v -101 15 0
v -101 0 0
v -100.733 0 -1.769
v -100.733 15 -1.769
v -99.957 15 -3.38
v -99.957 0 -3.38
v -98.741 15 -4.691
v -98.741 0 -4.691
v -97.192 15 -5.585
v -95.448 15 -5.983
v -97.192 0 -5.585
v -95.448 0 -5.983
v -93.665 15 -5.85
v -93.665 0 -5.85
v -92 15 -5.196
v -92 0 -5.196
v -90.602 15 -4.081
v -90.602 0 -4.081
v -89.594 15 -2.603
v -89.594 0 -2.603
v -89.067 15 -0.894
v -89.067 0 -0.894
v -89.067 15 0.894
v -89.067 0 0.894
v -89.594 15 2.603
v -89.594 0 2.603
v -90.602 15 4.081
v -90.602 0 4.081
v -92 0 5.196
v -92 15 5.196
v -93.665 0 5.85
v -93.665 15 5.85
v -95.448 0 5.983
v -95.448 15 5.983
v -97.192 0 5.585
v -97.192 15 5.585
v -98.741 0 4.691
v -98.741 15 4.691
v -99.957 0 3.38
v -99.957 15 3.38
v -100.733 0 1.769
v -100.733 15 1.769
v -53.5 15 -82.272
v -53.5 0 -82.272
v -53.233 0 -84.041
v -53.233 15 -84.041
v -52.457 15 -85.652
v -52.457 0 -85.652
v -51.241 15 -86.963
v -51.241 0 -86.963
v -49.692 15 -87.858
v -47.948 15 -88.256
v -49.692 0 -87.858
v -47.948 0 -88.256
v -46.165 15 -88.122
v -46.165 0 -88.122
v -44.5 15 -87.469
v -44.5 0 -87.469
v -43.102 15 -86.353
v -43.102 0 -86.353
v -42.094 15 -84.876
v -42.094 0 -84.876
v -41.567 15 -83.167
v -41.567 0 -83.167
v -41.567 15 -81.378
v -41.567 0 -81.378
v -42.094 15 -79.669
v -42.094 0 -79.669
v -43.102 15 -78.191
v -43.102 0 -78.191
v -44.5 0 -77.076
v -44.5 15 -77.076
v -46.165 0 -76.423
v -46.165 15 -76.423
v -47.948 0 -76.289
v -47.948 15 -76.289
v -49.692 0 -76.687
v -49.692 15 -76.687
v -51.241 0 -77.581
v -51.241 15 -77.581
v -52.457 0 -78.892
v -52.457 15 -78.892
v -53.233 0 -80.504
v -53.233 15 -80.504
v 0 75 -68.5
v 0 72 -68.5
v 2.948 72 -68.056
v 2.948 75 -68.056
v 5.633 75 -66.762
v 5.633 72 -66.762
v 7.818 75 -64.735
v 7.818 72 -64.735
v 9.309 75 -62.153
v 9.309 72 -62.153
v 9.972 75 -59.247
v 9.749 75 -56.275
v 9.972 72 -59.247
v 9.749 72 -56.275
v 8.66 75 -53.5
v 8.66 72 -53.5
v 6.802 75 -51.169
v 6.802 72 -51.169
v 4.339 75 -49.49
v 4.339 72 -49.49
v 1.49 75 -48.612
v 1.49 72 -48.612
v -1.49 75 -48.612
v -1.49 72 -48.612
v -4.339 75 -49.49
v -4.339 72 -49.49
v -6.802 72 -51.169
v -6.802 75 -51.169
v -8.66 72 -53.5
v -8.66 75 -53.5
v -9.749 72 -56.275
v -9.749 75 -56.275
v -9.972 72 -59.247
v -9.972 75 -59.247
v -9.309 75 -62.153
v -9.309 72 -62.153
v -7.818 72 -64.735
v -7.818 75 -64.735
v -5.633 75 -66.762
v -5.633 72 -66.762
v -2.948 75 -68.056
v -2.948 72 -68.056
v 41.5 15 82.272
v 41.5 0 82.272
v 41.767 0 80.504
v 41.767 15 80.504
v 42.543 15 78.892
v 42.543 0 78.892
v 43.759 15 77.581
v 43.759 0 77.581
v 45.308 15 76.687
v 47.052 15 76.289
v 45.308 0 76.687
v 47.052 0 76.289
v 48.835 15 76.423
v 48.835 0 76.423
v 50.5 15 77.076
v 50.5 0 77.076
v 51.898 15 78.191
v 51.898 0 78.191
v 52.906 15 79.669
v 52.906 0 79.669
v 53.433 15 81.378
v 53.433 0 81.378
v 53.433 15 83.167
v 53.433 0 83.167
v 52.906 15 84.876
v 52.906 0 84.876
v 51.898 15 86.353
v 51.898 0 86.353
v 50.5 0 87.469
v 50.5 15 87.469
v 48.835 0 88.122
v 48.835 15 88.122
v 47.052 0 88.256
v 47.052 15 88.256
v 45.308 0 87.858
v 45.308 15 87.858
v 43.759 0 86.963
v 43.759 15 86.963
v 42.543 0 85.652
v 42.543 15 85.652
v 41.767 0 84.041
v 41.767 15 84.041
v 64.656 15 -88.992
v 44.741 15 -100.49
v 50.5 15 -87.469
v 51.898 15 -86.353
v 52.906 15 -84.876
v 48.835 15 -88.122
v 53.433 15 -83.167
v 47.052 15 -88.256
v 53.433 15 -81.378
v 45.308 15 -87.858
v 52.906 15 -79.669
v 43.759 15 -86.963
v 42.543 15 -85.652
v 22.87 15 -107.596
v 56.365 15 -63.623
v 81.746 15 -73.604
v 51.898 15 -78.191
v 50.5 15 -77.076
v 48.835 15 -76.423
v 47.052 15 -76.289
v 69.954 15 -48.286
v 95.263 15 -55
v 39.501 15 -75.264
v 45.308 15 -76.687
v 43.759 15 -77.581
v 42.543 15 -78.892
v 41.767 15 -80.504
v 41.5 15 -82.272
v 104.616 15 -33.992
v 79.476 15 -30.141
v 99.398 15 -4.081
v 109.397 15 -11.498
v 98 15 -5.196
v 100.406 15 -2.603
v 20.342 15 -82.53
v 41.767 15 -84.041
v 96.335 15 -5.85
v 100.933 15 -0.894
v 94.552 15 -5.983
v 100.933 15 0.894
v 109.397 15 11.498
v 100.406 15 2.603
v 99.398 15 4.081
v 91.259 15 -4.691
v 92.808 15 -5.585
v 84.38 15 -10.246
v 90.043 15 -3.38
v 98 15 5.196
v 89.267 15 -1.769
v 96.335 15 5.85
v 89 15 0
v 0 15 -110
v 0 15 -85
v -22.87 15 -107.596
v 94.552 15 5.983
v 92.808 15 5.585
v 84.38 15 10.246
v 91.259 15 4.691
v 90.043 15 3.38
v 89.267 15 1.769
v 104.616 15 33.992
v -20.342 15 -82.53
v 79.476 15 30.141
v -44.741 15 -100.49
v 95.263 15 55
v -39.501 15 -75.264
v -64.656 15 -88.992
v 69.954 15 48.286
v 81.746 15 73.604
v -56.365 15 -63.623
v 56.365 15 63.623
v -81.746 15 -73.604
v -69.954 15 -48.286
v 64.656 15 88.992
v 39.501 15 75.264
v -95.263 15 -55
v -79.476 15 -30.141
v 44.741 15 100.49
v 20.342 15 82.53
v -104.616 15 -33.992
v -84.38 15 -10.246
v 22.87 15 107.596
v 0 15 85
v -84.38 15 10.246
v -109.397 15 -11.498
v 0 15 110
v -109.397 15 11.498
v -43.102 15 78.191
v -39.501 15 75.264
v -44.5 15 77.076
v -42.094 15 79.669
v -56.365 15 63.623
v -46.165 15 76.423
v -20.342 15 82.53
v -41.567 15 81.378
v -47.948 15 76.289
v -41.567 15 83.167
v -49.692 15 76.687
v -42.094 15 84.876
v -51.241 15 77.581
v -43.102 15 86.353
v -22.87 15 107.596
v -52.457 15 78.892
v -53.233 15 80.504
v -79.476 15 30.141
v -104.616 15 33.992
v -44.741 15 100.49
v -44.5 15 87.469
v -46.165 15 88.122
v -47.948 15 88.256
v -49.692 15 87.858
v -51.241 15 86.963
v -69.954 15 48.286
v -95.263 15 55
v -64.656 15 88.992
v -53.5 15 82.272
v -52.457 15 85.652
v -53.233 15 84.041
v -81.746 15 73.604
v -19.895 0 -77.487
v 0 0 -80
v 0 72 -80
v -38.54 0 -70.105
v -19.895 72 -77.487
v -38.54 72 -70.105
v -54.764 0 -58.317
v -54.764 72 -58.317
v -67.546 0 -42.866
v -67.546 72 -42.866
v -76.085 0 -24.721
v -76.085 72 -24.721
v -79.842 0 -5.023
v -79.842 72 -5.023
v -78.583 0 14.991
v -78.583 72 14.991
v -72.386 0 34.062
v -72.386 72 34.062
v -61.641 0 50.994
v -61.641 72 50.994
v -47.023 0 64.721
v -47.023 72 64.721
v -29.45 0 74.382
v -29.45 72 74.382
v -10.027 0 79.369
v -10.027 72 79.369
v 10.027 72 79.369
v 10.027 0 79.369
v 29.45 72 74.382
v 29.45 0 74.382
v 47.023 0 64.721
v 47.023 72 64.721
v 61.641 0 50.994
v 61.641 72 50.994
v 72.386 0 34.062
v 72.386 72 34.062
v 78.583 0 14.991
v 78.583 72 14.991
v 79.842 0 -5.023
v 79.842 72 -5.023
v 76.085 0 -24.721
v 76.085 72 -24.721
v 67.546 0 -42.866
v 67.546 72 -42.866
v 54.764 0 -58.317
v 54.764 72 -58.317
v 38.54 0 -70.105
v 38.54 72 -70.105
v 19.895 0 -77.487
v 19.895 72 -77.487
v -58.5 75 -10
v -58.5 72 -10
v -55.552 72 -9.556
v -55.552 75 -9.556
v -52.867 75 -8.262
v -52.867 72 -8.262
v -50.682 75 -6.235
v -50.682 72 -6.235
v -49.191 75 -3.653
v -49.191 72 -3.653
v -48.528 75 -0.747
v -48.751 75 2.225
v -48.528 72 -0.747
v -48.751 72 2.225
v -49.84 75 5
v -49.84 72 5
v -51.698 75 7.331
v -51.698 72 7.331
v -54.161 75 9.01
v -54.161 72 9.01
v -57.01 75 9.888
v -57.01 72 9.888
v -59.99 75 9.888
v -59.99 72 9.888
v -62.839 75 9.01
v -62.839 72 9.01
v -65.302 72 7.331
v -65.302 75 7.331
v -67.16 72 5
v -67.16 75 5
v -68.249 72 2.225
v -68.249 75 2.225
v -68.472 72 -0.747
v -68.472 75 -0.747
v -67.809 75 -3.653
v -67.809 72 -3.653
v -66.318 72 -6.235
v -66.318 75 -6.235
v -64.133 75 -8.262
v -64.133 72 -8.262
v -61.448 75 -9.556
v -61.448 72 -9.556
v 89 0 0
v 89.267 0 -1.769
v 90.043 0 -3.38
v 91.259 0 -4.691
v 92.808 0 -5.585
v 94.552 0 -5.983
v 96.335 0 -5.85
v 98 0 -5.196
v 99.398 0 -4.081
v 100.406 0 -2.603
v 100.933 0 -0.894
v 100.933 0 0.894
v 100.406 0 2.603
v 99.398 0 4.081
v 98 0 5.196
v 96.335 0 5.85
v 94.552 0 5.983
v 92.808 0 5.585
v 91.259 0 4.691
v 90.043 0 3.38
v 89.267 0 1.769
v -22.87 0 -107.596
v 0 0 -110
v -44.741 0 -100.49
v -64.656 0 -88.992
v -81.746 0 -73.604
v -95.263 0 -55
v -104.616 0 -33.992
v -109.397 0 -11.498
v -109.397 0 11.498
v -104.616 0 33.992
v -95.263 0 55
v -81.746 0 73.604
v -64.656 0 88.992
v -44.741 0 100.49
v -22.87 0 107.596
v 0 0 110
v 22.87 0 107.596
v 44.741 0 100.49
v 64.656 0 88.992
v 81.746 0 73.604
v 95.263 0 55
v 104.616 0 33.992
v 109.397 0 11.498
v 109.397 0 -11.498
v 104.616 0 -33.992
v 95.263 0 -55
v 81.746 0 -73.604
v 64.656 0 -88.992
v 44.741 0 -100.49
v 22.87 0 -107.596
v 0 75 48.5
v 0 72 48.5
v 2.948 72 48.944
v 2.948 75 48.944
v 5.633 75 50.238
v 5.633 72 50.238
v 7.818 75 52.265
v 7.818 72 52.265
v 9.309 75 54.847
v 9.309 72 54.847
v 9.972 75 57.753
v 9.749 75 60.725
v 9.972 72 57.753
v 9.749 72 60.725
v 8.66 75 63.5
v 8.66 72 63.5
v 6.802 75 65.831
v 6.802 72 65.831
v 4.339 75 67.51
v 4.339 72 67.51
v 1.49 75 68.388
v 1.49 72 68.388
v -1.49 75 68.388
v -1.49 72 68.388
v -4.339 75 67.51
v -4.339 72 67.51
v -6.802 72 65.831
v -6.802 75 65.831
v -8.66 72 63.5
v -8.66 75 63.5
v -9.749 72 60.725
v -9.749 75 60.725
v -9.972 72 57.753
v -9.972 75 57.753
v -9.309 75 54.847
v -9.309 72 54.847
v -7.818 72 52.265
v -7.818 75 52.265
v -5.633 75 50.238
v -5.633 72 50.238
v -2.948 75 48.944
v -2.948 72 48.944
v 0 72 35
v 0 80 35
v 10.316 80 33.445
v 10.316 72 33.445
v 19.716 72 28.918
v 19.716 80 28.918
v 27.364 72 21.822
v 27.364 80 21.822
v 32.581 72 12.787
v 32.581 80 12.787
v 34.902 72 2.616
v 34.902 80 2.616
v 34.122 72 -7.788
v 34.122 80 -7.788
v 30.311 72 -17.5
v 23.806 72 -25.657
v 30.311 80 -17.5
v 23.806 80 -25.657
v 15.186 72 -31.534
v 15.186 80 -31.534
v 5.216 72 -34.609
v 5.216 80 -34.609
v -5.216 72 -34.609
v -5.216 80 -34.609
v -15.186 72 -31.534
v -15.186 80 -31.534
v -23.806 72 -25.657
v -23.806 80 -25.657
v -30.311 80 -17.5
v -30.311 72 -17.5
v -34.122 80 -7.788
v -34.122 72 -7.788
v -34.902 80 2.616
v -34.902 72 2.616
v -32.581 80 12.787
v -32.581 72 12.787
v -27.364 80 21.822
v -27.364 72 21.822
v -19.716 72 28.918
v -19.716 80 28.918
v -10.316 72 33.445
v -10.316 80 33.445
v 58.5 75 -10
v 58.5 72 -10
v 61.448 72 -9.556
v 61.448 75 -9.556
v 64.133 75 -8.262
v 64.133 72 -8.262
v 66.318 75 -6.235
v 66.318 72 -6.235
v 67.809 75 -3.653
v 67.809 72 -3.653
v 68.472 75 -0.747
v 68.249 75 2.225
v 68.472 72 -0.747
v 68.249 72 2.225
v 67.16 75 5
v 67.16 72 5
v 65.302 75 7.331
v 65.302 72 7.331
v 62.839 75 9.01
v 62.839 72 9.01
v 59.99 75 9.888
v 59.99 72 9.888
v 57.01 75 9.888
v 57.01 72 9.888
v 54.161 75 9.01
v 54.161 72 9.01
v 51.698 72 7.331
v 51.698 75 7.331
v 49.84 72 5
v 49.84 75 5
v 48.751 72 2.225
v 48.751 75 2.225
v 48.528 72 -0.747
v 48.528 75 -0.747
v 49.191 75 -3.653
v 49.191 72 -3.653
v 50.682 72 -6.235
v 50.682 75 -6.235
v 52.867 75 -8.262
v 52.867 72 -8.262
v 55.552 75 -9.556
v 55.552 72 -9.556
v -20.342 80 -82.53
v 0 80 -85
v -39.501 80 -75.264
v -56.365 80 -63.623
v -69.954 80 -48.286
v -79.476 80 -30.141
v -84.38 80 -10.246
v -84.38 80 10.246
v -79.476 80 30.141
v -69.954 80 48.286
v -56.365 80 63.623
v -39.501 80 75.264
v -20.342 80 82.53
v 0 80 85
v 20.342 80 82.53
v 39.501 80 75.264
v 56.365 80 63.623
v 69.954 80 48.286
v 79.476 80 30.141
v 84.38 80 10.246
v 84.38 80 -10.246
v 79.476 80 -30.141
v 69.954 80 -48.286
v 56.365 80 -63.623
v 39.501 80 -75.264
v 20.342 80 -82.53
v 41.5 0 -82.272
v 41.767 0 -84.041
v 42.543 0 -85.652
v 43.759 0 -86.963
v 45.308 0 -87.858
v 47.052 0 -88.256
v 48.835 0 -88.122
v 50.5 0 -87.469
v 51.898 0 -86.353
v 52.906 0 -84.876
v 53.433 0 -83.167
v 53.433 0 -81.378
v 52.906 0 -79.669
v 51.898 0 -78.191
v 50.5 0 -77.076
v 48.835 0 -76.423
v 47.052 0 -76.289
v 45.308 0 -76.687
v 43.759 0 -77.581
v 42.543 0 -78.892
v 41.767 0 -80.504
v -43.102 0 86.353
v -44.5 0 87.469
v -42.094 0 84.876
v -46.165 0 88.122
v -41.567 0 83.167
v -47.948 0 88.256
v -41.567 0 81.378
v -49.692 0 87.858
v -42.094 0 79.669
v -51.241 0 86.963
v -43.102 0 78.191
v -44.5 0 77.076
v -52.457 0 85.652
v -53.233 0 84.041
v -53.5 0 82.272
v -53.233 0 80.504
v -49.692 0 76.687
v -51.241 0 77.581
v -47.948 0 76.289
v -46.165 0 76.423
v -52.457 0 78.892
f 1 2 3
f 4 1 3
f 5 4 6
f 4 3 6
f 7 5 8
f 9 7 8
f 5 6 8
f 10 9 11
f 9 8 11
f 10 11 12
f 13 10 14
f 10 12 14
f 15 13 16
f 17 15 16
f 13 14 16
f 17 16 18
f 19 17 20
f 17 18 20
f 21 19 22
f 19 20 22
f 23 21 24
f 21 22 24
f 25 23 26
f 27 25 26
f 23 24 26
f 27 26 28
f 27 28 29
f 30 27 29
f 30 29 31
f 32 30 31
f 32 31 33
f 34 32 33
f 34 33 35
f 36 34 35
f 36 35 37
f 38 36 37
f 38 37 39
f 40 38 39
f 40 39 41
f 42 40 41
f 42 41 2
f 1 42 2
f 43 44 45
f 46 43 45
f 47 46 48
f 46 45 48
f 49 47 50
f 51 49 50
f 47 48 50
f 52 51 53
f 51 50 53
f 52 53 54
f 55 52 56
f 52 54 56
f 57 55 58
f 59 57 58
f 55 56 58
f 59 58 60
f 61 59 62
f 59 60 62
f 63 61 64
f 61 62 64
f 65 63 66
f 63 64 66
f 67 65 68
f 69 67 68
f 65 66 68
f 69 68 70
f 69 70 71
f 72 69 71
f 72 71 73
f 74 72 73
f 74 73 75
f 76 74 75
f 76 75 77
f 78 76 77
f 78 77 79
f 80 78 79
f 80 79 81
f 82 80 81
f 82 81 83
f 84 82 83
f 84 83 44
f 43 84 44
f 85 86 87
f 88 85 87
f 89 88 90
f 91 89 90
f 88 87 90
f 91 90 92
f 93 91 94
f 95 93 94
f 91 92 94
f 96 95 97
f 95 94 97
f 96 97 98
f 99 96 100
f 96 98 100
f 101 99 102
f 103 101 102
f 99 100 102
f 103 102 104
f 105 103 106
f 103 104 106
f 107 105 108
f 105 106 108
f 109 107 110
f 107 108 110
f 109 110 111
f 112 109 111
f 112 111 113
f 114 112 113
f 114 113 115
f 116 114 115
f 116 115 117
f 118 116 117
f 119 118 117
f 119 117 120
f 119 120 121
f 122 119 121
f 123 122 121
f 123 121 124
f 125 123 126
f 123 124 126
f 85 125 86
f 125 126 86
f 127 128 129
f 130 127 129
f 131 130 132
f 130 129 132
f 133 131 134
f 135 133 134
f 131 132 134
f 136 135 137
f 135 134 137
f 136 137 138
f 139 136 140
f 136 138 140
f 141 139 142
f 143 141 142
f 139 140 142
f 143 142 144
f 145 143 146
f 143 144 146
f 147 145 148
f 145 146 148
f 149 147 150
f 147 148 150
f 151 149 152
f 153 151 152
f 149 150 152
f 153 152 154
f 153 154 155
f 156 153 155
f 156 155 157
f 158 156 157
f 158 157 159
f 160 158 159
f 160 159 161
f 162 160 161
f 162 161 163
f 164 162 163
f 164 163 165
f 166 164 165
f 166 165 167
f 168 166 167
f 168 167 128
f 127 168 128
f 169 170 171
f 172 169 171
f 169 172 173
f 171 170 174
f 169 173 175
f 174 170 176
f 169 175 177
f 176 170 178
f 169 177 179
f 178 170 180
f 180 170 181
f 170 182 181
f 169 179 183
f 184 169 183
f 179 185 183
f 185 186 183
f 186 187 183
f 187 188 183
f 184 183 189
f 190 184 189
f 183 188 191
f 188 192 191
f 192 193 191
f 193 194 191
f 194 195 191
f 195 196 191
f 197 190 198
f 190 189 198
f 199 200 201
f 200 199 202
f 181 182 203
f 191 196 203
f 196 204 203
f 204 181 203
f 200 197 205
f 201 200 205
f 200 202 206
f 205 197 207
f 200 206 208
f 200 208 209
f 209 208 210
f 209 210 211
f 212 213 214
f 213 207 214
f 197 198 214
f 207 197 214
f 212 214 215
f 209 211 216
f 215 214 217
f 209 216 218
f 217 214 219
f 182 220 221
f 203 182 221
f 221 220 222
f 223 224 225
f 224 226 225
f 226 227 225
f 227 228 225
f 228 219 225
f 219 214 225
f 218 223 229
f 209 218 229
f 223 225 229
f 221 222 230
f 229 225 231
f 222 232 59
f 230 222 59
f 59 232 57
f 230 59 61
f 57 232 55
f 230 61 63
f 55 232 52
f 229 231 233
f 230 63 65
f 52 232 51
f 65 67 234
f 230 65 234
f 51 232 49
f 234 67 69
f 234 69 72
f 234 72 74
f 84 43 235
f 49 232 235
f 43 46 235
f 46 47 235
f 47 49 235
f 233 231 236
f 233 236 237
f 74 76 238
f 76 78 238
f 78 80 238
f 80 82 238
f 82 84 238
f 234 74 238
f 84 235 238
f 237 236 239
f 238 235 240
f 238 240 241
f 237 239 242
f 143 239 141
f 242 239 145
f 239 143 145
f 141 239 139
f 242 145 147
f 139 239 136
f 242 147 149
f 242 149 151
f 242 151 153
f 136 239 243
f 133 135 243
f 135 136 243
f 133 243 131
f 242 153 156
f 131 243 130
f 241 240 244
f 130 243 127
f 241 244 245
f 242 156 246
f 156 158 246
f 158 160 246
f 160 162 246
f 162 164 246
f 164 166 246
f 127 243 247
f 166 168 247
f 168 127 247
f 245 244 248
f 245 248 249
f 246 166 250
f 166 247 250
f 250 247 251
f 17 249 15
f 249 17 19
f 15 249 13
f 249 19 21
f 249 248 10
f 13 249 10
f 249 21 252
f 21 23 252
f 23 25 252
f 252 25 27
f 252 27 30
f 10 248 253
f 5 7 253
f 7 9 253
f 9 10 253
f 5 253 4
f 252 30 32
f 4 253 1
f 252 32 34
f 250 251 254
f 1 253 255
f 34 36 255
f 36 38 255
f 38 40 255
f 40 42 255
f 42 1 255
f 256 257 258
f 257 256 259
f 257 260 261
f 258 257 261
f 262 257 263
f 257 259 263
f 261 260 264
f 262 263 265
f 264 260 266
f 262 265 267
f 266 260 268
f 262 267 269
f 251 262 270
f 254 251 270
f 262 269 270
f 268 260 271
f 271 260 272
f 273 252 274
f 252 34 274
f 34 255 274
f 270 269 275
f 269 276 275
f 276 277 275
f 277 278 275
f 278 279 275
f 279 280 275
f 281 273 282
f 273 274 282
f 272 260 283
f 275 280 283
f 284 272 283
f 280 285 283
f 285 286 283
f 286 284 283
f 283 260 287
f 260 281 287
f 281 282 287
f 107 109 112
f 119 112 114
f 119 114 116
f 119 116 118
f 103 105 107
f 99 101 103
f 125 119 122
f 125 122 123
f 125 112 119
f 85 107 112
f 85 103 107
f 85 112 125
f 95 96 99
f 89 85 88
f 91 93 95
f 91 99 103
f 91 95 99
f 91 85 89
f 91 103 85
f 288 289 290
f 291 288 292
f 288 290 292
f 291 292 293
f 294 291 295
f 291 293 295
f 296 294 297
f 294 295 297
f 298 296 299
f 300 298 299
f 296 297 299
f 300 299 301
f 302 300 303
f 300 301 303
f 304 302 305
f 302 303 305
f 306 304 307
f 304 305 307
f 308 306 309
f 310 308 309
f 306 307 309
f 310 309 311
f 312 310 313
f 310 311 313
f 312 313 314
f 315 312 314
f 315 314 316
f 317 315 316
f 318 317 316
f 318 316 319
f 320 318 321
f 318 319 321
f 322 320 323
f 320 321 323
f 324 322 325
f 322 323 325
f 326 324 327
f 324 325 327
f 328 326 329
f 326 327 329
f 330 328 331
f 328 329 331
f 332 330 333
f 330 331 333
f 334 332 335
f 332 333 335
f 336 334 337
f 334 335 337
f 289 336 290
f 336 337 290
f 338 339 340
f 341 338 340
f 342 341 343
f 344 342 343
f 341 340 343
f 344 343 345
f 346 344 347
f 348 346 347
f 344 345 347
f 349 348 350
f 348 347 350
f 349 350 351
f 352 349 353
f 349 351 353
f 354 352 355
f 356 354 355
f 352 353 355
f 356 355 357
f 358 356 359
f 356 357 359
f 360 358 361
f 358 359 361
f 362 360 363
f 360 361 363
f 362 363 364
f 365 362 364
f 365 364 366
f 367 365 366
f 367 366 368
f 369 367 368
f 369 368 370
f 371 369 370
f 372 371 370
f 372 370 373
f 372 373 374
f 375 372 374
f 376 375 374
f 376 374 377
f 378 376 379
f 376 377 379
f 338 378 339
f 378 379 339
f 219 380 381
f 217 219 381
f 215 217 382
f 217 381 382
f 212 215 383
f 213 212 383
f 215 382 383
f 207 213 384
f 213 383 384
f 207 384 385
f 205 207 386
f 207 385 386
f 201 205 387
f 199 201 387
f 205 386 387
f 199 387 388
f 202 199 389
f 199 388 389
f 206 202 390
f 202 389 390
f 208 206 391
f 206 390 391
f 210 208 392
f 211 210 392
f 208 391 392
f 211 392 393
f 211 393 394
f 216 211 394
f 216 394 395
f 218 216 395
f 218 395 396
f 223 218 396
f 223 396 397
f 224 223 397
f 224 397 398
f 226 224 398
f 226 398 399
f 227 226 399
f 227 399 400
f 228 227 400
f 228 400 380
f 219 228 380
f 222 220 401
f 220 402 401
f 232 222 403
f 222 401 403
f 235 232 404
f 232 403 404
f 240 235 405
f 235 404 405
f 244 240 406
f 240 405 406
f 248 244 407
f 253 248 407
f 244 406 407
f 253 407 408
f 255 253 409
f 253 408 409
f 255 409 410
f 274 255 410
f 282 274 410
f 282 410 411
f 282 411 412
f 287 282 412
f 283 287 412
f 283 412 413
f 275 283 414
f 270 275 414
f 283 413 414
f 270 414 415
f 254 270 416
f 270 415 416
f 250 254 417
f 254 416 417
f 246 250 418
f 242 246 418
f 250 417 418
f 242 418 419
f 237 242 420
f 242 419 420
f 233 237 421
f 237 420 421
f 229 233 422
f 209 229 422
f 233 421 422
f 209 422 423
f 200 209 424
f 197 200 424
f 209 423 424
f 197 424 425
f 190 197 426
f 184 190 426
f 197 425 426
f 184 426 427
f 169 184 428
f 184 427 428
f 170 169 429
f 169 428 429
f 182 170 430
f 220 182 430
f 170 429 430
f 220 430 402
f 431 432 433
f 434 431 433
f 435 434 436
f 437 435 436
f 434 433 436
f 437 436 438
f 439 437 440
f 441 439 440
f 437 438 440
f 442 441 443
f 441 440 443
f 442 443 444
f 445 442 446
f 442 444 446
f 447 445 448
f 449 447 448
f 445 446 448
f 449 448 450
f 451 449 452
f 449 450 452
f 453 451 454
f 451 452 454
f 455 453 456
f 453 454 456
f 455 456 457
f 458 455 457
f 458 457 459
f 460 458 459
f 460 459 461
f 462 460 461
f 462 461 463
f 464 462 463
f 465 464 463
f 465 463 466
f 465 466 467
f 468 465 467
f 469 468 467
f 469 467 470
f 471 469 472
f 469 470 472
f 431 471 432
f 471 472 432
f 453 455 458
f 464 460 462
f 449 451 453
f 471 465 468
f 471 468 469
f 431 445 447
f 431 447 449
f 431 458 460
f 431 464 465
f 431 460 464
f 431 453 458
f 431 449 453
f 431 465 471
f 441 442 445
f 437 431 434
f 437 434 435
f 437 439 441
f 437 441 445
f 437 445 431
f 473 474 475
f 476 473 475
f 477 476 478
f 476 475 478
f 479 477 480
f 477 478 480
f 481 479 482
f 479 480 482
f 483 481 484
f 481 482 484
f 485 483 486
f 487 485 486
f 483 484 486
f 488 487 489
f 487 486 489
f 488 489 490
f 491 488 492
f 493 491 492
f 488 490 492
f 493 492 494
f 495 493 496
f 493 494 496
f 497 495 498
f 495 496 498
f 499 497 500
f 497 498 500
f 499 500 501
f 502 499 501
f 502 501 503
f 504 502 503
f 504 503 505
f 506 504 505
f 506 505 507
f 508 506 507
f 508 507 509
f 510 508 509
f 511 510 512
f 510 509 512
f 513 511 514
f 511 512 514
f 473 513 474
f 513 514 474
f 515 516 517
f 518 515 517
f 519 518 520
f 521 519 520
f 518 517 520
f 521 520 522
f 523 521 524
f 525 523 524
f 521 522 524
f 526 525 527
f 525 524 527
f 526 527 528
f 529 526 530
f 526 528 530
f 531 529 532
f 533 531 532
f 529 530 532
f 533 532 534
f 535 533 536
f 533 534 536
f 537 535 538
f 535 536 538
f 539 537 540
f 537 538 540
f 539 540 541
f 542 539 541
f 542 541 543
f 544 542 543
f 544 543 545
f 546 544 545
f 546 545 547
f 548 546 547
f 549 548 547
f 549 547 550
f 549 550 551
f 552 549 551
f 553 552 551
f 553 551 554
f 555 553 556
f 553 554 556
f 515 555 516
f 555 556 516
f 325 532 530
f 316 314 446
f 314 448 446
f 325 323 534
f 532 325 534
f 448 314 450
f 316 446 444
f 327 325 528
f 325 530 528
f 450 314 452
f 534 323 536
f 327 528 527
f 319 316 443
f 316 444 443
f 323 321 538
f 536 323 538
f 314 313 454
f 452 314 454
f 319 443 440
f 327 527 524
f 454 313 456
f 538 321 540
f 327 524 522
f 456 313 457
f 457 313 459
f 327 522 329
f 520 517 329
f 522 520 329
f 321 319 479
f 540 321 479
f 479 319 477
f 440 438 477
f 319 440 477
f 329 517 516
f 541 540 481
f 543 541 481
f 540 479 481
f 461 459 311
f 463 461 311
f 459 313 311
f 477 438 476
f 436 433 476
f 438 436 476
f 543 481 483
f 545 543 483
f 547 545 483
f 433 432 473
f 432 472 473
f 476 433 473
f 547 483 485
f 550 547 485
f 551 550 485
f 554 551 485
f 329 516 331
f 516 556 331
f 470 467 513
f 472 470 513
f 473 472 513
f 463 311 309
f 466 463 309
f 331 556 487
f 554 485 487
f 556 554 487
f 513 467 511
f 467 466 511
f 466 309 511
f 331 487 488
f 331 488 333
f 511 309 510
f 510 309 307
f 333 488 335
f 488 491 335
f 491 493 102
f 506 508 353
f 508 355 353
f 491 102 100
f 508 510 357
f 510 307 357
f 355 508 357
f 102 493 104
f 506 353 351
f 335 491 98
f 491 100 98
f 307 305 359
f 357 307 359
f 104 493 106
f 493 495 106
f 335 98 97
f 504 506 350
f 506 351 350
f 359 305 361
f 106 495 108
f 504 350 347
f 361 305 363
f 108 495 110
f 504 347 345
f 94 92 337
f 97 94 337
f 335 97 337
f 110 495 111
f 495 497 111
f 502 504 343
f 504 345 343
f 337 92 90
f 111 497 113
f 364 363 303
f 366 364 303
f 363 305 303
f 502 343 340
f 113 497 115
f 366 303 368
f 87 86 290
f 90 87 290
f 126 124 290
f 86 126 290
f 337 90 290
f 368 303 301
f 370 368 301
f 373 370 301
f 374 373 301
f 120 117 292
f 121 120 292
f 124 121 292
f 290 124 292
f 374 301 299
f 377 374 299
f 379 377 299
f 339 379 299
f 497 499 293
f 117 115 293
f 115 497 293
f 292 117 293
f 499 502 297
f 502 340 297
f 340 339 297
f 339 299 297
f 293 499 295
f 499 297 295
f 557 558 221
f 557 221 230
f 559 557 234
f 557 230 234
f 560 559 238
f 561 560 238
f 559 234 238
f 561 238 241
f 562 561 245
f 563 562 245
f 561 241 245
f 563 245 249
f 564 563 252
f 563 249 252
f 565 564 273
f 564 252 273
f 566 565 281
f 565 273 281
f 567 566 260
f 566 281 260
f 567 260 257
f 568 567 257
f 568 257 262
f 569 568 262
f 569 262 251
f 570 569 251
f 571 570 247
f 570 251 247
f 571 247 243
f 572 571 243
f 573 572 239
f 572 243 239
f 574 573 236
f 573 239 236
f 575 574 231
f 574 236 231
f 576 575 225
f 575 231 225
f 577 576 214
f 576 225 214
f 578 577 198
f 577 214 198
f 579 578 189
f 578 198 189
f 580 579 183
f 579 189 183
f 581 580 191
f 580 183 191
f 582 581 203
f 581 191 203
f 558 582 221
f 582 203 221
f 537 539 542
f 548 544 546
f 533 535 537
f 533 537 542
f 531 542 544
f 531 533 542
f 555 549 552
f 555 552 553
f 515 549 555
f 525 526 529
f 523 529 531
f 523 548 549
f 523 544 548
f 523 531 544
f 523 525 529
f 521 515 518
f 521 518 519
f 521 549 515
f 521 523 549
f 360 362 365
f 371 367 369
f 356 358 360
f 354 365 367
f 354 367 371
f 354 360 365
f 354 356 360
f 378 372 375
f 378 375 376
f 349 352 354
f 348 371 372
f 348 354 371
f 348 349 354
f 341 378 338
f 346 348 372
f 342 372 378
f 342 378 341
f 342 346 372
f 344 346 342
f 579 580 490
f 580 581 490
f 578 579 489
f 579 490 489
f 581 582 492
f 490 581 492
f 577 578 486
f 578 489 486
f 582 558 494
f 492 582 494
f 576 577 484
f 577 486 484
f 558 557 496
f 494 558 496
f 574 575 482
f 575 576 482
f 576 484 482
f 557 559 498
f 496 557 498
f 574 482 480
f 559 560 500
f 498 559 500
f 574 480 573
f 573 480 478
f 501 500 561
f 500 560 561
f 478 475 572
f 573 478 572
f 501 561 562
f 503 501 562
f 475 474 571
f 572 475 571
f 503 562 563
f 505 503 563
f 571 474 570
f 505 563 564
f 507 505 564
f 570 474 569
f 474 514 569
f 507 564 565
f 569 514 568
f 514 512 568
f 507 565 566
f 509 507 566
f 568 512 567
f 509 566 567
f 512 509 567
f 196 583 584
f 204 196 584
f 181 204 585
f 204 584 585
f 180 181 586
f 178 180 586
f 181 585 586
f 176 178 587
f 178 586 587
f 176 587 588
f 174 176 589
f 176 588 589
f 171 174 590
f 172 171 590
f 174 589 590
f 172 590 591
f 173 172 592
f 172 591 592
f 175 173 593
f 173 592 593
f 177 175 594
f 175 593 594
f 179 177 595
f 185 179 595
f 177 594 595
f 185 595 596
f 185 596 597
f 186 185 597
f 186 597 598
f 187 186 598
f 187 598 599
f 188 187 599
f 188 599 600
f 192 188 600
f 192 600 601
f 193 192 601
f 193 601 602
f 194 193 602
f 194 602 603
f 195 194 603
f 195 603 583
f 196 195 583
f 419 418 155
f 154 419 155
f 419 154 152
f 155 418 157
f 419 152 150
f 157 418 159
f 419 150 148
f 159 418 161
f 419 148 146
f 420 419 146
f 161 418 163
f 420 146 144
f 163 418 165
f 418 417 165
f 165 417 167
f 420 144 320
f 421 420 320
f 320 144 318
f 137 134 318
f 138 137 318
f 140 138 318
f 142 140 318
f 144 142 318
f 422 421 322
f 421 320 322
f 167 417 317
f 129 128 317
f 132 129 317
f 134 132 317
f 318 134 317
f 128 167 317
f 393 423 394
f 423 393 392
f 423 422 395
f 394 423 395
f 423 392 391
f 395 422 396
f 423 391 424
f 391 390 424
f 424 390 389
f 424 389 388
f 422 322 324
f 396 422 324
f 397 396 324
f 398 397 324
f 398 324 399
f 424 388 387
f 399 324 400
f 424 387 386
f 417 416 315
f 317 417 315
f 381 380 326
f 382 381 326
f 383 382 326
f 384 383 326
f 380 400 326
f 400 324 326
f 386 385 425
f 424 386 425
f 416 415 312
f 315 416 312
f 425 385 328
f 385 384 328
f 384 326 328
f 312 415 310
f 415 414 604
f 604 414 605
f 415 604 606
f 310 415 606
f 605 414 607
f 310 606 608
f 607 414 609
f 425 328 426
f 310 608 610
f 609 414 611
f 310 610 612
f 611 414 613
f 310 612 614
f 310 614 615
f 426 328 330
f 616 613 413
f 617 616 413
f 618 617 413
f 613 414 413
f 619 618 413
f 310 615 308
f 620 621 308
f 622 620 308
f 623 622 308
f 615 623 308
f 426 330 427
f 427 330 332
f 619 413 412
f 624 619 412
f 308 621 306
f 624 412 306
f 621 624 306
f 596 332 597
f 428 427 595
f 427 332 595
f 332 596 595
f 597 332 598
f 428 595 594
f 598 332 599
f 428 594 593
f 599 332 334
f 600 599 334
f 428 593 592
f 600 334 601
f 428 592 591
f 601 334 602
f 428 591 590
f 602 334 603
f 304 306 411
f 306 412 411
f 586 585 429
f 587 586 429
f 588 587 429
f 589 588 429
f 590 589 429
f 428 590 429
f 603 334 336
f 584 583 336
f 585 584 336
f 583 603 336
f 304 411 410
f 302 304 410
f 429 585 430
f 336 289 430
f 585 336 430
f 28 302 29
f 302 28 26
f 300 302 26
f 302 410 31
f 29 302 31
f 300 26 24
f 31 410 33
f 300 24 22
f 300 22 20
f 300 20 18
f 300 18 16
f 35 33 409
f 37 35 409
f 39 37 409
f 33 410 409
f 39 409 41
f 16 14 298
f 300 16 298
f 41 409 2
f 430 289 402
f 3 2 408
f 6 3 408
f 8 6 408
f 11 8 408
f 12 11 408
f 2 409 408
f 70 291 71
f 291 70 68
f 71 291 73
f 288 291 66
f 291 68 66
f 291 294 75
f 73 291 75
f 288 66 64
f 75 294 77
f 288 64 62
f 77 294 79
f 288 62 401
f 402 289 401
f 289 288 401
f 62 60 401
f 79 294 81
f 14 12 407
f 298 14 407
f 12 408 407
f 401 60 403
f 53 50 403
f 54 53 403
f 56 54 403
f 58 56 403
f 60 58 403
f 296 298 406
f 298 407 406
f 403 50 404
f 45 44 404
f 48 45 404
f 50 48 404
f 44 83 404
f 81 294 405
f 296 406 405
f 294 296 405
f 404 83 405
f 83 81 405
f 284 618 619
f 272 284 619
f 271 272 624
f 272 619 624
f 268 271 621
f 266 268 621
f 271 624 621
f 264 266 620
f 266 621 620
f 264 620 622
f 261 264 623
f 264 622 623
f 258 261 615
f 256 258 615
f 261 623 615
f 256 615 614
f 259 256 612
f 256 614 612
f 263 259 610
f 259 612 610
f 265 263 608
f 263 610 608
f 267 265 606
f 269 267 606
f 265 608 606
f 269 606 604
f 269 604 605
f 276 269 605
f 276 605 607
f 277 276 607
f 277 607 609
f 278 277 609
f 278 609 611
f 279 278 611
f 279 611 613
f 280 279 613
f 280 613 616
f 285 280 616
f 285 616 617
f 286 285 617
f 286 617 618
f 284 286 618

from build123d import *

# Parameters (mm, degrees)
SKETCH2_R                  = 35
CUT_EXTRUDE1_DEPTH         = 8
F_12_0_12_DIAMETER_HOLE1_D = 12
SKETCH7_R                  = 10
CUT_EXTRUDE2_DEPTH         = 3


with BuildPart() as part:
    # Sketch1 → Revolve1 (revolve)
    with BuildSketch(Plane.XY, mode=Mode.PRIVATE) as revolve1_sk:
        Polygon((-80, 72), (0, 72), (0, 80), (-85, 80), (-85, 15), (-110, 15), (-110, 0), (-80, 0), align=None)
    revolve(revolve1_sk.sketch.rotate(Axis((0, 0, 0), (0, 1, 0)), 270), axis=Axis((0, 0, 0), (0, 1, 0)))

    # Sketch2 → Cut-Extrude1 (cut)
    with BuildSketch(Plane(origin=(0, 80, 0), x_dir=(1, 0, 0), z_dir=(0, 1, 0))):
        with Locations(Location((0, 0, 0), (0, 0, 270))):
            Circle(SKETCH2_R)
    extrude(amount=-CUT_EXTRUDE1_DEPTH, mode=Mode.SUBTRACT)

    # Ø12.0 (12) Diameter Hole1 (through all)
    with Locations(Plane(origin=(0, 15, 0), x_dir=(1, 0, 0), z_dir=(0, 1, 0))):
        with Locations((-47.5, -82.27241336), (-95, 0), (-47.5, 82.27241336), (47.5, 82.27241336), (95, 0), (47.5, -82.27241336)):
            Hole(F_12_0_12_DIAMETER_HOLE1_D / 2)

    # Sketch7 → Cut-Extrude2 (cut)
    with BuildSketch(Plane.XZ.offset(-72)):
        with Locations(Location((0, 58.5, 0), (0, 0, 270))):
            Circle(SKETCH7_R)
        with Locations(Location((58.5, 0, 0), (0, 0, 270))):
            Circle(SKETCH7_R)
        with Locations(Location((0, -58.5, 0), (0, 0, 270))):
            Circle(SKETCH7_R)
        with Locations(Location((-58.5, 0, 0), (0, 0, 270))):
            Circle(SKETCH7_R)
    extrude(amount=-CUT_EXTRUDE2_DEPTH, mode=Mode.SUBTRACT)


solid = part.part
